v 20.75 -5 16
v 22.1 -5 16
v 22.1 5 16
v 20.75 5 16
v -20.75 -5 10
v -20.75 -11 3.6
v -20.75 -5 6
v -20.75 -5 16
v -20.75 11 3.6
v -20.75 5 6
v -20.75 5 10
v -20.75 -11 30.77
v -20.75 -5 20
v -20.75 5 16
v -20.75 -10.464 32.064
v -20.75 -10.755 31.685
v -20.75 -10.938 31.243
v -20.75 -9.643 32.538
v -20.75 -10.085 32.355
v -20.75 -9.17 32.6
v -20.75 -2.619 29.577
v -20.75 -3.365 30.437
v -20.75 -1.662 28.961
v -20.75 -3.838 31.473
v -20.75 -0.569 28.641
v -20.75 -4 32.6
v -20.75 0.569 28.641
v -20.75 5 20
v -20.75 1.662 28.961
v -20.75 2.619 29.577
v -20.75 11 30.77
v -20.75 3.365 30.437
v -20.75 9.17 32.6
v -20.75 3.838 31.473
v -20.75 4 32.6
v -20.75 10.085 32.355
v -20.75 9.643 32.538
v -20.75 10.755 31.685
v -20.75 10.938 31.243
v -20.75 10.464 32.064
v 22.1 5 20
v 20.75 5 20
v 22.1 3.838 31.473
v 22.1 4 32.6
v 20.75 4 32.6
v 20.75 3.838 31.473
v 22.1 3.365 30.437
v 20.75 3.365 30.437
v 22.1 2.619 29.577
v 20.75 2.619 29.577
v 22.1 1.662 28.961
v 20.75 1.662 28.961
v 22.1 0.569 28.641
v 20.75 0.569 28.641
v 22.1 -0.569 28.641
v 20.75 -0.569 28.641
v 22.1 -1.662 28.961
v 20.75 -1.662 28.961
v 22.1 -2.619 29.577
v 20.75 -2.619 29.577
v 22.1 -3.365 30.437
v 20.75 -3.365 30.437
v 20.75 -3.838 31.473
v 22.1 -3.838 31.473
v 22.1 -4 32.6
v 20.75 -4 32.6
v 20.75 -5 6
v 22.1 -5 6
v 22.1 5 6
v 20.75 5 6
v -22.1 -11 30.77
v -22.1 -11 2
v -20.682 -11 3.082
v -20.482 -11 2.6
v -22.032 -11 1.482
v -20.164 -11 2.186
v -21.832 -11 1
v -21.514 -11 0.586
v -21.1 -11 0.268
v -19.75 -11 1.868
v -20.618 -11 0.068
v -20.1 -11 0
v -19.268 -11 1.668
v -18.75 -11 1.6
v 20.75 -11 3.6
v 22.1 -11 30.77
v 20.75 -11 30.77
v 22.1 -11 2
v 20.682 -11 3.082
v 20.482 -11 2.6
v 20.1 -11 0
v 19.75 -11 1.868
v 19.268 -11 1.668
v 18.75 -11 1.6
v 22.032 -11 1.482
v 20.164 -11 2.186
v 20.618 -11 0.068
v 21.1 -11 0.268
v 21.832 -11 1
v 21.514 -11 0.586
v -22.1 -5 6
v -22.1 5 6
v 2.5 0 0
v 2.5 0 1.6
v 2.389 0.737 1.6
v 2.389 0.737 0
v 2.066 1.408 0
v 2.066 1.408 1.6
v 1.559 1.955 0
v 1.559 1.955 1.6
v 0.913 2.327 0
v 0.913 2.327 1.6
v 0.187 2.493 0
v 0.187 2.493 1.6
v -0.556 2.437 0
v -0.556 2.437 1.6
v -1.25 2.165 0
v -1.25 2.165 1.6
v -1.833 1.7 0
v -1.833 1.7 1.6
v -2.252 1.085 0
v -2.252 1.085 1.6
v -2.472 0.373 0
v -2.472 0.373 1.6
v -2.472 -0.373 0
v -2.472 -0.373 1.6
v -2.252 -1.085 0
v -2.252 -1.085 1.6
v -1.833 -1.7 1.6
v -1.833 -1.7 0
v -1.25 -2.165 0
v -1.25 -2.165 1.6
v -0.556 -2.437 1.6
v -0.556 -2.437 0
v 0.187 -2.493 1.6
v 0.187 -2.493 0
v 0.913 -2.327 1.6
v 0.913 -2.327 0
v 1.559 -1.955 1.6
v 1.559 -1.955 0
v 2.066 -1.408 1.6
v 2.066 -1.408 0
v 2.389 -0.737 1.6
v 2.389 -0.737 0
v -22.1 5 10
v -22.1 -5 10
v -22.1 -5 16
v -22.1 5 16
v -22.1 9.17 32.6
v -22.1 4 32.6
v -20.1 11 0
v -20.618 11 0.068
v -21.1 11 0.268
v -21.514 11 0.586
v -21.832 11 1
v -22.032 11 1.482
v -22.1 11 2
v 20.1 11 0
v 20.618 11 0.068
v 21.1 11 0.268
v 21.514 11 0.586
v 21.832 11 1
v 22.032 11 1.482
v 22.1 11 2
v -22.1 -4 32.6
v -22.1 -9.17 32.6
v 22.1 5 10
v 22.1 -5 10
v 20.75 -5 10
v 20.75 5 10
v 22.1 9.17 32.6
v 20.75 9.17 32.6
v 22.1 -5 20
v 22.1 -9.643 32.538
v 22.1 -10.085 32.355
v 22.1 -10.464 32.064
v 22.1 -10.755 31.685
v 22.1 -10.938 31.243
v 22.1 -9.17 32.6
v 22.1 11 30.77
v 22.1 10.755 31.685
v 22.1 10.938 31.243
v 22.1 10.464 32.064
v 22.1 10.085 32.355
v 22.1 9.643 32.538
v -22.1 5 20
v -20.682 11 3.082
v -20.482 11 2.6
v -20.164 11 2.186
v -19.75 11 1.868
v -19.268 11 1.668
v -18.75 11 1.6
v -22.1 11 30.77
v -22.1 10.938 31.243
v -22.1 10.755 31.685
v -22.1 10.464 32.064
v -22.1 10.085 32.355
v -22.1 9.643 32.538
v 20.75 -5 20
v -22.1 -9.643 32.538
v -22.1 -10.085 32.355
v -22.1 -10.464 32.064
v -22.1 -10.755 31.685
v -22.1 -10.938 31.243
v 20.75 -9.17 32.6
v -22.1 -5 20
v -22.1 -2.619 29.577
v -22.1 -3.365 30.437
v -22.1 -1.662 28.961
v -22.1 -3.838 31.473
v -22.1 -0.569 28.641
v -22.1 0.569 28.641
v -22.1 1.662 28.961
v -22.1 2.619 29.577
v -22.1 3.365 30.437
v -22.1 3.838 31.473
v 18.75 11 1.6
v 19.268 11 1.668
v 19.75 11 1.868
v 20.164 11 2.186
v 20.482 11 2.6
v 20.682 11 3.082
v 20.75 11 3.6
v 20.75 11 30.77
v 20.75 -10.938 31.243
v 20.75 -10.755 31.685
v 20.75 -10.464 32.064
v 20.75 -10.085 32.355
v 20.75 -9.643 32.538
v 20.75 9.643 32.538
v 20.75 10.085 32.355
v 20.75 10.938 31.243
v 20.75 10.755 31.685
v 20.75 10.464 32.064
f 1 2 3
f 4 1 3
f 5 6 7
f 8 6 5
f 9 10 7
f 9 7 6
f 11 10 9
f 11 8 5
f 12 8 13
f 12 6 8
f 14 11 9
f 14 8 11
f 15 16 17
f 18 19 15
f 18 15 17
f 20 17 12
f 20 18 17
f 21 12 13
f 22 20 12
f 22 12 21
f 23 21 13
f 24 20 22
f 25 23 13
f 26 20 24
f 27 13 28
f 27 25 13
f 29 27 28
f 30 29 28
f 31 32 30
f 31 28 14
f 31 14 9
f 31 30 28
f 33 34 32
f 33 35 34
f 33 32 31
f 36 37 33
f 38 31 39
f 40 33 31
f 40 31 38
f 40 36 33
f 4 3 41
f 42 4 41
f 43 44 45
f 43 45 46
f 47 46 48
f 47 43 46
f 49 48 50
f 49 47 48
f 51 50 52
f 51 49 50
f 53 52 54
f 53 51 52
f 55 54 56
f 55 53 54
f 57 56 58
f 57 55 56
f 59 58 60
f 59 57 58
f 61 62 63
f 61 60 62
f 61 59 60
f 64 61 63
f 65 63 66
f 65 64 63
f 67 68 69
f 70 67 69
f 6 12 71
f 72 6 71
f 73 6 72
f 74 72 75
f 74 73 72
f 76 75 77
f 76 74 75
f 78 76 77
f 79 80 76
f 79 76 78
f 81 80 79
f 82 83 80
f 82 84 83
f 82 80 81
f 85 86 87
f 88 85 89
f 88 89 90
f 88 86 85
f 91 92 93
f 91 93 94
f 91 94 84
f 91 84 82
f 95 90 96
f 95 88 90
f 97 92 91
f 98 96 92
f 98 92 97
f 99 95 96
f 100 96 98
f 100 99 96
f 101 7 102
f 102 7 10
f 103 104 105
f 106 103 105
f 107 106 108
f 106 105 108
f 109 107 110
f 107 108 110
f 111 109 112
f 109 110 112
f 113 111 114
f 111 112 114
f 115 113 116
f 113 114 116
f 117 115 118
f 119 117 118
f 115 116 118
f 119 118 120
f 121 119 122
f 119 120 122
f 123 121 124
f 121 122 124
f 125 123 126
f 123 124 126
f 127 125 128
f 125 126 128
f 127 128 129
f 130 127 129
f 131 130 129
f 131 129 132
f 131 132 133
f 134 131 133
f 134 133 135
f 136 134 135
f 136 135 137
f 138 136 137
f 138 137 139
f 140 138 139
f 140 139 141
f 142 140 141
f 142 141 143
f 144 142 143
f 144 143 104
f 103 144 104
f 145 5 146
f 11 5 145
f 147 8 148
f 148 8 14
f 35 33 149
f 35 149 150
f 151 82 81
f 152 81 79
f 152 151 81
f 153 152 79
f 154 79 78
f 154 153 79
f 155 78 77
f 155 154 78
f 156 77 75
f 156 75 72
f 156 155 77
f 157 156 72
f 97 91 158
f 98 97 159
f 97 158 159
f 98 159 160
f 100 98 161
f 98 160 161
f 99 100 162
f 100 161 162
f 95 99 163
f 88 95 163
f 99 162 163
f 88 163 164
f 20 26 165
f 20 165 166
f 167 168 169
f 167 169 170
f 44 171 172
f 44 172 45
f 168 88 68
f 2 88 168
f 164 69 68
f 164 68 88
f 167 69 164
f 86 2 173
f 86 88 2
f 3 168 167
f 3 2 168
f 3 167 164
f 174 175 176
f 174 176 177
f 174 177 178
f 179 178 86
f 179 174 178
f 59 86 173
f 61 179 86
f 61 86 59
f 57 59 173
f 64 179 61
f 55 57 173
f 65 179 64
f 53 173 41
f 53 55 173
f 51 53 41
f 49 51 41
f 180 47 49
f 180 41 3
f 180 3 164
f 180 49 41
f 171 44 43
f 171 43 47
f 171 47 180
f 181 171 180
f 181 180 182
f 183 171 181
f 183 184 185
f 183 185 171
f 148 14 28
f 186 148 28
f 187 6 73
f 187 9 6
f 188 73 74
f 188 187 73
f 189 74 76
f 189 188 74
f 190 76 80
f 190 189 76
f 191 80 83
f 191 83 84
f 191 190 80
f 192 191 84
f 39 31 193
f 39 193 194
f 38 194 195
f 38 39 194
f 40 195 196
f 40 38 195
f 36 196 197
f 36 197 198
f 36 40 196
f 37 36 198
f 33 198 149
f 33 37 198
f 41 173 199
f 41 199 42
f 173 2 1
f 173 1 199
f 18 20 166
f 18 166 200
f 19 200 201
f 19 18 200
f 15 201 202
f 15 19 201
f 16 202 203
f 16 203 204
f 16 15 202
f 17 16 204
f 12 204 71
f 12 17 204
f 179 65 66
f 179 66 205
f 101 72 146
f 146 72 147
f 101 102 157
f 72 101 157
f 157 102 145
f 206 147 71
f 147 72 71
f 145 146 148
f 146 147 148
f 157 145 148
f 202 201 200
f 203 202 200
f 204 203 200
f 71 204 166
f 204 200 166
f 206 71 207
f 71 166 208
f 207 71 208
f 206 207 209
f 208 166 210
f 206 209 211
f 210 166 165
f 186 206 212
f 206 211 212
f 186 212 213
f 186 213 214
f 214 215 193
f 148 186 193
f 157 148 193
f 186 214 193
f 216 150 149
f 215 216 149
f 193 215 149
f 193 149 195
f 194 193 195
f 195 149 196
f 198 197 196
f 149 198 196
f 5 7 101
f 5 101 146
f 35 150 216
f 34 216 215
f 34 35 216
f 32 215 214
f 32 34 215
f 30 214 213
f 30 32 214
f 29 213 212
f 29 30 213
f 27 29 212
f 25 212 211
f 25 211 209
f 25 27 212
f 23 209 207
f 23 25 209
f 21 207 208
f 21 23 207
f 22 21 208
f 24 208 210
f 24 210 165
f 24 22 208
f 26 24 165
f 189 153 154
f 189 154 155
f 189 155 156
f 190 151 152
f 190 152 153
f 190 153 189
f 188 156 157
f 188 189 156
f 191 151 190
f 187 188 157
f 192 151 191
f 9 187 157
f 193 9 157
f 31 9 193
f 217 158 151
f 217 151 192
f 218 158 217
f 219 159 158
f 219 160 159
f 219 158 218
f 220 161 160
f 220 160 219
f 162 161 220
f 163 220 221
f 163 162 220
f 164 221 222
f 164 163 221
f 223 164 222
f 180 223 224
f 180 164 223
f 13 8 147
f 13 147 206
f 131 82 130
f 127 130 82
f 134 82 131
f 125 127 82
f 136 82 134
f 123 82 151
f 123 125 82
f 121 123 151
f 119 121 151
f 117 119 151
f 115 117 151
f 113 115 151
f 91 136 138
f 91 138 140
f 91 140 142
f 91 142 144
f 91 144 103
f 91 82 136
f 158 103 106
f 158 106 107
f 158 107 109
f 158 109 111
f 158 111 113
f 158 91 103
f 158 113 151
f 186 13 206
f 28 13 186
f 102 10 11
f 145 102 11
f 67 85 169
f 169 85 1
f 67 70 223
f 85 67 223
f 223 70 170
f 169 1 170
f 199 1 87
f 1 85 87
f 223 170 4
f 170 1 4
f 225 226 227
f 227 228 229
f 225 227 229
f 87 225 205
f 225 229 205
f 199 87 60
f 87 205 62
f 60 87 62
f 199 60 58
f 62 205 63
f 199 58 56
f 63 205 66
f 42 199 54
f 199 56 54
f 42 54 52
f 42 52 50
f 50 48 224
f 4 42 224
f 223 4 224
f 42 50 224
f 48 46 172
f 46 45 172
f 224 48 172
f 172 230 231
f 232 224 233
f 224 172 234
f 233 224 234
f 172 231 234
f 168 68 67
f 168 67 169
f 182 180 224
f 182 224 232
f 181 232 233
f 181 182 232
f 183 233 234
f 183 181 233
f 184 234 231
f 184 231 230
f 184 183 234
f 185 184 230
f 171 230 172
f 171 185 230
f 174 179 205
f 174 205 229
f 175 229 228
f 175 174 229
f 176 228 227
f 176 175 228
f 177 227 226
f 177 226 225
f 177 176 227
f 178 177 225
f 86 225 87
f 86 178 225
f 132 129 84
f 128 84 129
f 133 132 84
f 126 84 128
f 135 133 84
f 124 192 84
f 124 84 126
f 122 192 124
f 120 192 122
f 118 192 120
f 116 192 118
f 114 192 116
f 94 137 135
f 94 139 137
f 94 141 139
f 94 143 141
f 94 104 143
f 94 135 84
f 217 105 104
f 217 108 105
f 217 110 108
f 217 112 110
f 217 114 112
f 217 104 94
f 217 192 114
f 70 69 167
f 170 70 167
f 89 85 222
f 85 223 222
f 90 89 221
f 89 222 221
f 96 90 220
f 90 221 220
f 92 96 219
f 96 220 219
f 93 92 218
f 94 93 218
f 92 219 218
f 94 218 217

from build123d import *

# Parameters (mm, degrees)
F0_W     = 10
F0_H     = 4
F1_DEPTH = 22.1
F2_W     = 41.5
F2_H     = 43.485662
F3_DEPTH = 31
F4_R     = 2
F5_R     = 2
F6_R     = 2.5
F7_DEPTH = 25


with BuildPart() as f1:
    # F0 (on Right) → F1 (new body, symmetric)
    with BuildSketch(Plane.YZ):
        with BuildLine():
            Line((-11, 30.769719), (-11, 0))
            Line((-11, 0), (11, 0))
            Line((11, 0), (11, 30.769719))
            ThreePointArc((11, 30.769719), (10.463923, 32.063923), (9.169719, 32.6))
            Line((9.169719, 32.6), (4, 32.6))
            ThreePointArc((4, 32.6), (0, 28.6), (-4, 32.6))
            Line((-4, 32.6), (-9.169719, 32.6))
            ThreePointArc((-9.169719, 32.6), (-10.463923, 32.063923), (-11, 30.769719))
        make_face()
        with Locations((0, 8)):
            Rectangle(F0_W, F0_H, mode=Mode.SUBTRACT)
        with Locations((0, 18)):
            Rectangle(F0_W, F0_H, mode=Mode.SUBTRACT)
    extrude(amount=F1_DEPTH, both=True)

    # F2 (on face) → F3 (cut)
    with BuildSketch(Plane.XY.offset(32.6)):
        with Locations((0, -0.558951)):
            Rectangle(F2_W, F2_H)
    extrude(amount=-F3_DEPTH, mode=Mode.SUBTRACT)

    # F4
    f4_edges = [f1.edges().sort_by_distance(p)[0] for p in [
        (-22.1, 0, 0),
    ]]
    fillet(f4_edges, radius=F4_R)

    # F5
    f5_edges = [f1.edges().sort_by_distance(p)[0] for p in [
        (22.1, 0, 0),
        (-20.75, 0, 1.6),
        (20.75, 0, 1.6),
    ]]
    fillet(f5_edges, radius=F5_R)

    # F6 (on face) → F7 (cut)
    with BuildSketch(Plane.XY.offset(1.6)):
        Circle(F6_R)
    extrude(amount=-F7_DEPTH, mode=Mode.SUBTRACT)


solid = f1.part
